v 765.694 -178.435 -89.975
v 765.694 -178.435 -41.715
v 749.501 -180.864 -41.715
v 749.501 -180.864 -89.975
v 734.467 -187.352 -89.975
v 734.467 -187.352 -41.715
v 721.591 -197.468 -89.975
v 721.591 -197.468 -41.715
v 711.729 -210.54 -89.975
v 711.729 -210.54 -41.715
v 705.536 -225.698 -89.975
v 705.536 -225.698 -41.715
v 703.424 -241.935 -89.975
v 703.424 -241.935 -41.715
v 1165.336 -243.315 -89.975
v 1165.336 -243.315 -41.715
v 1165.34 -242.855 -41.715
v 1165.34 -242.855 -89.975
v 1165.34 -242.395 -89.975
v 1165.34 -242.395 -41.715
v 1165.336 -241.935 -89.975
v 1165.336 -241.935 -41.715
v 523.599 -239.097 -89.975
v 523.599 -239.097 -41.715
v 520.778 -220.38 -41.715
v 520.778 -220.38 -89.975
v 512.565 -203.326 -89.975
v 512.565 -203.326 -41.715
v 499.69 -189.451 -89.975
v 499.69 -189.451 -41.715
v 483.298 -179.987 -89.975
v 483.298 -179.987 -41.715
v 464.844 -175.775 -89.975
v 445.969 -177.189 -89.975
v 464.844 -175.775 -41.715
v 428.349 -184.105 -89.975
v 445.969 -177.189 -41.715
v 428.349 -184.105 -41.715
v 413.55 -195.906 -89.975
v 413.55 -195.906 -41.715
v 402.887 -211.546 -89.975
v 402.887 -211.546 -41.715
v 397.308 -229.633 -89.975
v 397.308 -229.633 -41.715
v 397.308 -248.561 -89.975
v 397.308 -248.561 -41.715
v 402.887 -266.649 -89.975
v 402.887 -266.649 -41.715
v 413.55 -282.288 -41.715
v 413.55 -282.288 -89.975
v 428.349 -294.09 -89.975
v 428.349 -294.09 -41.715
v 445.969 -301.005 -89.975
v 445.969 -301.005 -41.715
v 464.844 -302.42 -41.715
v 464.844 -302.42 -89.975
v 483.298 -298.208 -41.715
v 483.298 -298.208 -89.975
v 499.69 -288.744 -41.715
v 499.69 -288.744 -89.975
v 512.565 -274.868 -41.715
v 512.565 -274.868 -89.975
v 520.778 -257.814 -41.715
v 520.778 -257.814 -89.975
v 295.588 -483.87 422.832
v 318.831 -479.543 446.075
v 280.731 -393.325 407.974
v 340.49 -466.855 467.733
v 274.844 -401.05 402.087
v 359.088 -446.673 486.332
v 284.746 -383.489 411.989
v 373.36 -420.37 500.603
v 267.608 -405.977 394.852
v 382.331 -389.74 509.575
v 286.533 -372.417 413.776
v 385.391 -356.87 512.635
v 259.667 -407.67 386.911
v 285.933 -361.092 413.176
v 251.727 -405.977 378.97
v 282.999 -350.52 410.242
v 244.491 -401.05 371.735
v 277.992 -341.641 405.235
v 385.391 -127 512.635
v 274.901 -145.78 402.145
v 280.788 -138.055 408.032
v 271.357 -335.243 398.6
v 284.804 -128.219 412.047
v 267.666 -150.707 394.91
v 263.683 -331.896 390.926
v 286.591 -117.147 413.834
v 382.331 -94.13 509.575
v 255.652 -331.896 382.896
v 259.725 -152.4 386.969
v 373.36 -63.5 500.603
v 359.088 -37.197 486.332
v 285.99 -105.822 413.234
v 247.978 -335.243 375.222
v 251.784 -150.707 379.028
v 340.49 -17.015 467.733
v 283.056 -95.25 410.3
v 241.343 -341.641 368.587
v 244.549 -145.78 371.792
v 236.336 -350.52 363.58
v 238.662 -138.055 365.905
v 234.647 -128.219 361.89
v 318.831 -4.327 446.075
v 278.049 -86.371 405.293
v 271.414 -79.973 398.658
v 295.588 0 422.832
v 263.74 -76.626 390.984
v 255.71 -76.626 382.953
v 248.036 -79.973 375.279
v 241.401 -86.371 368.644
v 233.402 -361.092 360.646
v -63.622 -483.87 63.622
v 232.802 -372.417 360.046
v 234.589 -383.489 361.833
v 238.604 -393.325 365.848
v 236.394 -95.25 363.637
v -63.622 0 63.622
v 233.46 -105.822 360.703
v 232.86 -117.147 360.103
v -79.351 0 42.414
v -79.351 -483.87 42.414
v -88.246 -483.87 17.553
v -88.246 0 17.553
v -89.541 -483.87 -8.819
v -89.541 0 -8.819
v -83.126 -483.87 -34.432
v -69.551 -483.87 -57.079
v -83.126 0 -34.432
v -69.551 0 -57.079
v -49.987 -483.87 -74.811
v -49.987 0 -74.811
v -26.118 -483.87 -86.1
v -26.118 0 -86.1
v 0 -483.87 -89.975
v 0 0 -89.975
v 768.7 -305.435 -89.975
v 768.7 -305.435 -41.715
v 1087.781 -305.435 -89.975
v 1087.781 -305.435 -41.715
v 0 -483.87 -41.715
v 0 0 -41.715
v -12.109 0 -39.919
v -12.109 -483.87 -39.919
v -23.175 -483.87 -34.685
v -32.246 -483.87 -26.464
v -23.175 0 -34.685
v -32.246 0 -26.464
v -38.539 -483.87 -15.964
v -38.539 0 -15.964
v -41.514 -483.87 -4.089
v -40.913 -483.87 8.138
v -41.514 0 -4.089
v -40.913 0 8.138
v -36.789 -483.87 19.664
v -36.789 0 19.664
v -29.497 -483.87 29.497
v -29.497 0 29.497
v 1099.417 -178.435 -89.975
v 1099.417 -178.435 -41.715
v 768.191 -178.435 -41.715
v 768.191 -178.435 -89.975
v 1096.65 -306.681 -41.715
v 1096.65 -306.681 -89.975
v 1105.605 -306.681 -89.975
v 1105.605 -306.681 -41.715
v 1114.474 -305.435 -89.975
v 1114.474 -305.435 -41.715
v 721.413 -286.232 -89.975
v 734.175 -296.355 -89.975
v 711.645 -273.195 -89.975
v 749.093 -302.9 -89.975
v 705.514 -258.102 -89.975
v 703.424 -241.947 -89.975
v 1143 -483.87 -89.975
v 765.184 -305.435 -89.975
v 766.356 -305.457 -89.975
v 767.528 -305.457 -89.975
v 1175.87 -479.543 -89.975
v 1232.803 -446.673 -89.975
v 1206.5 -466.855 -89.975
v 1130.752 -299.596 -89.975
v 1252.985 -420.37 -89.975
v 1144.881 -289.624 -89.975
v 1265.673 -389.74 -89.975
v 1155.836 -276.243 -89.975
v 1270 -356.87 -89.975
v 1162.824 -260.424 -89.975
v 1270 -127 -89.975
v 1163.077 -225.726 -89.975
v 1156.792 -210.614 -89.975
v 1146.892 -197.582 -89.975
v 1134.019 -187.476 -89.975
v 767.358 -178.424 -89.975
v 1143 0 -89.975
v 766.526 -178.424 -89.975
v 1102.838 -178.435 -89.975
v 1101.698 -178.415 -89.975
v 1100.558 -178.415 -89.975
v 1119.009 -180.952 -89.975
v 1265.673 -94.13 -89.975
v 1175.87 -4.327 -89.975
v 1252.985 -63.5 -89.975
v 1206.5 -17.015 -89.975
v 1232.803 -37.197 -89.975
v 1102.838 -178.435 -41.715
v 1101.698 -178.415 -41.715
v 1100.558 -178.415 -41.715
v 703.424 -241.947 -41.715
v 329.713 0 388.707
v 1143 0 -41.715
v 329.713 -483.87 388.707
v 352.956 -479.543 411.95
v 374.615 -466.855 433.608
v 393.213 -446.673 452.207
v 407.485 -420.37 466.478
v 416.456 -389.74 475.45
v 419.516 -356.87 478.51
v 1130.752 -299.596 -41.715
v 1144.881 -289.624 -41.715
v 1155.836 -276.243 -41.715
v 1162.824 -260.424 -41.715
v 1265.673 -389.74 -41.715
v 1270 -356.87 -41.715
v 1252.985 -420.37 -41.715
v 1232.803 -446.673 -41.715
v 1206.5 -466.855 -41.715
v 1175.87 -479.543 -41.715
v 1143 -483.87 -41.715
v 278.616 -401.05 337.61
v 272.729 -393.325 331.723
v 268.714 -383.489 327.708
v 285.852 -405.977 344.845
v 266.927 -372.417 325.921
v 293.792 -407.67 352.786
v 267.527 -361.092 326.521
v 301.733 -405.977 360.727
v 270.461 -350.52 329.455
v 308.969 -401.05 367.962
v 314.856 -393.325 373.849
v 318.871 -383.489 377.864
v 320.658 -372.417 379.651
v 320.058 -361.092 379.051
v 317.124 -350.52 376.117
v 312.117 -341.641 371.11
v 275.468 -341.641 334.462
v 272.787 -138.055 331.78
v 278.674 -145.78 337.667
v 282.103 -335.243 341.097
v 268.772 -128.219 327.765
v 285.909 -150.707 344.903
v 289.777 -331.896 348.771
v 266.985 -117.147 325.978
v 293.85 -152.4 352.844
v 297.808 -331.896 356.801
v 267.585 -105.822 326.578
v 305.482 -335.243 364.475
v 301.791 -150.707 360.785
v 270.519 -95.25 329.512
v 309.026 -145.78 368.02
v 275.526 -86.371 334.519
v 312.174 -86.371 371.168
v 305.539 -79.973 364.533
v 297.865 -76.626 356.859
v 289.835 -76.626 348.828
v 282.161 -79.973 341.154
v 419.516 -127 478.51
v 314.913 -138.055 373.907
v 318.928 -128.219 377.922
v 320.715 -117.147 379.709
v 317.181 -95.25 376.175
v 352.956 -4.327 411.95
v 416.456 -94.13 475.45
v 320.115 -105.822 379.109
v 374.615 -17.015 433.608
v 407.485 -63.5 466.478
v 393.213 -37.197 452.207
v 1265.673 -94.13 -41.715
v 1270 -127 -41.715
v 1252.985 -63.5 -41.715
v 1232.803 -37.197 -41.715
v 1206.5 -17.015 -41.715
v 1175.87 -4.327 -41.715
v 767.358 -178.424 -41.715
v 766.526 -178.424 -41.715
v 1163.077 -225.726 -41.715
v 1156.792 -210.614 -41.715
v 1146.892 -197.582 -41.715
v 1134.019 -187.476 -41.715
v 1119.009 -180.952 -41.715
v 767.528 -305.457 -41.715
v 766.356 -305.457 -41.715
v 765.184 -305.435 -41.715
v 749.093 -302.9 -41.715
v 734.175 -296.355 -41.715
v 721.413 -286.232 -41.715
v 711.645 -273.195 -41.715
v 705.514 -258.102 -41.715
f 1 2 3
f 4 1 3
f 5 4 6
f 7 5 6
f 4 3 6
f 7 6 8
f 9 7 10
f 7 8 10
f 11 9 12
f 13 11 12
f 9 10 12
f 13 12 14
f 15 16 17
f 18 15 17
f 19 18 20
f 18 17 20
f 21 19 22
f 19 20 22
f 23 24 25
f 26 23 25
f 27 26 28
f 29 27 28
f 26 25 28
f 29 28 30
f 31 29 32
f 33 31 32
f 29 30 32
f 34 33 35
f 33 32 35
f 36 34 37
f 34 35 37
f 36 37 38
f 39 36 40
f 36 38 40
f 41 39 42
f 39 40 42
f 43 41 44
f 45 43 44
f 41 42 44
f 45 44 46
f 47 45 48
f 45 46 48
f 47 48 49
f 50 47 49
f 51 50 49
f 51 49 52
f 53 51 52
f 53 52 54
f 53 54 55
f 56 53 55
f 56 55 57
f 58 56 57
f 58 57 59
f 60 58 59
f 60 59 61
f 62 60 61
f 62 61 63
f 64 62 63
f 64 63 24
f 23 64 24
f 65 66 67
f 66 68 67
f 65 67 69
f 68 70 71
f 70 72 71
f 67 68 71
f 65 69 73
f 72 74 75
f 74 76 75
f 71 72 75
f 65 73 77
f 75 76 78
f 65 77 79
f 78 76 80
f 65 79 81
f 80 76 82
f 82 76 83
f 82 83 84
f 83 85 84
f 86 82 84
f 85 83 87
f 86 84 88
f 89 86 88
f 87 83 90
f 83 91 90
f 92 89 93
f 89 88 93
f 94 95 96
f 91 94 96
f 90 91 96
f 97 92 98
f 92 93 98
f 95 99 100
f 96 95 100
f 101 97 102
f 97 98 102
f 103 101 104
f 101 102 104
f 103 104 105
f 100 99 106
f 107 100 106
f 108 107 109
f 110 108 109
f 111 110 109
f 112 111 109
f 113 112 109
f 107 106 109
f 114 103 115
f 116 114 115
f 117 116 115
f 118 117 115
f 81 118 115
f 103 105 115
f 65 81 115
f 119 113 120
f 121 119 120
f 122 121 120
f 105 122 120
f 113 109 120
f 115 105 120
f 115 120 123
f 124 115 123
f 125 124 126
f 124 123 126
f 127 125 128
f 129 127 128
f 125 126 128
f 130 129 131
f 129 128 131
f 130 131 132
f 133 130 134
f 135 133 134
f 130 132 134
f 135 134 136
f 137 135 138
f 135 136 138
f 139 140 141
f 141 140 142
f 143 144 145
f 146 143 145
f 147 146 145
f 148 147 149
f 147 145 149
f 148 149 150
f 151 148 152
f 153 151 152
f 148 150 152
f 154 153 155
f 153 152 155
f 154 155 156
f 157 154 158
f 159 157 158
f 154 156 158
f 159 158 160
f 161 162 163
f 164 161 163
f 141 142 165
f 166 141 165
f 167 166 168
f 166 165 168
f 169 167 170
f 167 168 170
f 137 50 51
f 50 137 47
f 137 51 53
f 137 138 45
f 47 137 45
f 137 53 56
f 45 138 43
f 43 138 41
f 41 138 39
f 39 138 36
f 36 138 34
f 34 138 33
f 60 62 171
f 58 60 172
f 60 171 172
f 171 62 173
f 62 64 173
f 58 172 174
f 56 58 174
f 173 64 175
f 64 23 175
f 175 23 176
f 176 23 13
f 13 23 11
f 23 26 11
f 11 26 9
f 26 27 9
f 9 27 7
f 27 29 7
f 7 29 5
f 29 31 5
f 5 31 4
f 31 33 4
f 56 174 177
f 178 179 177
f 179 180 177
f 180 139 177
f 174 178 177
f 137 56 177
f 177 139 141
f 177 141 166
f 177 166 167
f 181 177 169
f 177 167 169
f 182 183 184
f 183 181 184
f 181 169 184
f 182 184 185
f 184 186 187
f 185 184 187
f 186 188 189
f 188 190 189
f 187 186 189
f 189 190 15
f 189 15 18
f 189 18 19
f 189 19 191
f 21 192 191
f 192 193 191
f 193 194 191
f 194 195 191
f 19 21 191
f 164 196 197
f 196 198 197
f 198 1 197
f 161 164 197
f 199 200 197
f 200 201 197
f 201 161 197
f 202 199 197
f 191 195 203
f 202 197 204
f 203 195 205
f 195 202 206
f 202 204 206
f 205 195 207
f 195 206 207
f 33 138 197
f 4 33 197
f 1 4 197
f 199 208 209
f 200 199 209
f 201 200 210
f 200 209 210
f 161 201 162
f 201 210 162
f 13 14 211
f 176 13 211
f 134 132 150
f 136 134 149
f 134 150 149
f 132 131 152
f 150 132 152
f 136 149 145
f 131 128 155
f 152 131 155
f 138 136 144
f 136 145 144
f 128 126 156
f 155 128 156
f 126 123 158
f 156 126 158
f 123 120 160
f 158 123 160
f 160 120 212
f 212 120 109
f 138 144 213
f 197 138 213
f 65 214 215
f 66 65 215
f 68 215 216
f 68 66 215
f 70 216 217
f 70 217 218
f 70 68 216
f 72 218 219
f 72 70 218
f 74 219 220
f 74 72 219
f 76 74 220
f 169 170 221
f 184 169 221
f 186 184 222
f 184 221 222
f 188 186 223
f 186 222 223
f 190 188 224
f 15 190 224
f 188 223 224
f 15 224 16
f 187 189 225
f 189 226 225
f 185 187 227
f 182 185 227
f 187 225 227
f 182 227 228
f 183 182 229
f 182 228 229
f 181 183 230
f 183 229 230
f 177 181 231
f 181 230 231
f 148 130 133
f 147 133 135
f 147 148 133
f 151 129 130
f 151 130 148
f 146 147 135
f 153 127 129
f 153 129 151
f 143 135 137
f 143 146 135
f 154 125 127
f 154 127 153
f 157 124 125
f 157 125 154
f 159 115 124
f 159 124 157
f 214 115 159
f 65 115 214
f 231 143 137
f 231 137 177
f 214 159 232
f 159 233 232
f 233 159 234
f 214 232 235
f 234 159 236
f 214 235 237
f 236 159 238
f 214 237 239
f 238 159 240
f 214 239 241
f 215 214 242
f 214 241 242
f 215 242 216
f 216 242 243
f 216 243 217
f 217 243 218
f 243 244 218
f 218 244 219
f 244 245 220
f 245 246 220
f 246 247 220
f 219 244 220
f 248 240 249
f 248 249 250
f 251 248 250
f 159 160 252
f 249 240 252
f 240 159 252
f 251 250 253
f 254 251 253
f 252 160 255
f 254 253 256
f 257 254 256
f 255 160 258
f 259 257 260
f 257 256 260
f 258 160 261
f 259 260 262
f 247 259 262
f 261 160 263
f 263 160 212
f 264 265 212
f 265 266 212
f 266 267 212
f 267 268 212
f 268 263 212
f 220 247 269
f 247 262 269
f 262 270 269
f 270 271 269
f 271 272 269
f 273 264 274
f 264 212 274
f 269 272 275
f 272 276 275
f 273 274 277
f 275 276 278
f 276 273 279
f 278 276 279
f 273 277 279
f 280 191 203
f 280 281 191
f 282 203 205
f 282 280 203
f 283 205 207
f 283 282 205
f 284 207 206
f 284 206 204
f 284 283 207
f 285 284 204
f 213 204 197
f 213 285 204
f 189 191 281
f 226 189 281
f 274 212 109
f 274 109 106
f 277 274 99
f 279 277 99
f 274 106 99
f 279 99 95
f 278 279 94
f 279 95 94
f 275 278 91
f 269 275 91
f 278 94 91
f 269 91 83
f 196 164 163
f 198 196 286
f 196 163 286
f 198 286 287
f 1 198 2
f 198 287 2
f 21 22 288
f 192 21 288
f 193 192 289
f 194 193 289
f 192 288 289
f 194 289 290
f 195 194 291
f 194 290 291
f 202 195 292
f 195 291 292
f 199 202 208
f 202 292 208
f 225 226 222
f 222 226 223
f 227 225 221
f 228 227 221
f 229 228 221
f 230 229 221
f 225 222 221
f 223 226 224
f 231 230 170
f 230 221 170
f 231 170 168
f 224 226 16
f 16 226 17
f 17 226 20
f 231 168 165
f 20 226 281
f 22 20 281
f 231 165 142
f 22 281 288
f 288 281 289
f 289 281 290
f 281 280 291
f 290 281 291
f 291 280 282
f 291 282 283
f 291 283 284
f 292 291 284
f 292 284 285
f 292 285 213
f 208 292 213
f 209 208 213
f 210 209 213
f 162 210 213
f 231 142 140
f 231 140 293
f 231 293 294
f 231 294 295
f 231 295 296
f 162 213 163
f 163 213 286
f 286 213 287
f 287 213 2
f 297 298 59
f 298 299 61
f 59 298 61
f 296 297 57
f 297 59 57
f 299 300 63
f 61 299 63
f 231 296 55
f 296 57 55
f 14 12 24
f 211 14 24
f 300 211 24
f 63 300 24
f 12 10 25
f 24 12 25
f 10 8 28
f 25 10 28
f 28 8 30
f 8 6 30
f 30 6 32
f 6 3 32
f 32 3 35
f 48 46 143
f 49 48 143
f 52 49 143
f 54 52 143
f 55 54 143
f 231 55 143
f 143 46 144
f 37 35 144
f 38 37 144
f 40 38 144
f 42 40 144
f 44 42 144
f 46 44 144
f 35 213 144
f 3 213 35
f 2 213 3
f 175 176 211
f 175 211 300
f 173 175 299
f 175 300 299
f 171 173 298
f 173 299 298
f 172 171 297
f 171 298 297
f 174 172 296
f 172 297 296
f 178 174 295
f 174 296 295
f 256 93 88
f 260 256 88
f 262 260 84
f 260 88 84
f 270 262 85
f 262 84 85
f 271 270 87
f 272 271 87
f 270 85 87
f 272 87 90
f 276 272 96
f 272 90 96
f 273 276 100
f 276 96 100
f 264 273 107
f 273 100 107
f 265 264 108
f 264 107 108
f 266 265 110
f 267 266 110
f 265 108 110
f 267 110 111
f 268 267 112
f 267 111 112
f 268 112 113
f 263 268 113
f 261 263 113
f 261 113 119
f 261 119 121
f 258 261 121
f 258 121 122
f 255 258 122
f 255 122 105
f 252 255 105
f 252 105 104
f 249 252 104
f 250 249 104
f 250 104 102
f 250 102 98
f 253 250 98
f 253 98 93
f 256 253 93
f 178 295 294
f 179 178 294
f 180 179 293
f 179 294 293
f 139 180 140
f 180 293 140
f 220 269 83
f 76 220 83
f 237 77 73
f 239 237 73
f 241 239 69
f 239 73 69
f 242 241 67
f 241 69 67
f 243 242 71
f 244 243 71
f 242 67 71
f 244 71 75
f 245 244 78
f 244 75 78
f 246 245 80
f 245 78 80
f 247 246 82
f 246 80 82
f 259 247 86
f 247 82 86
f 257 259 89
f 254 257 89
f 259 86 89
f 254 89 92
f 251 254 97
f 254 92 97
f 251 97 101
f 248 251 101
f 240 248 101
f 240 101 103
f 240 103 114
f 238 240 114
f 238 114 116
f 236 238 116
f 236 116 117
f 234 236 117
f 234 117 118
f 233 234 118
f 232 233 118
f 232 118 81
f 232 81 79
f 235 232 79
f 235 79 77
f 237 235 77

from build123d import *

# Parameters (mm, degrees)
F1_DEPTH = 483.87
F2_R     = 127
F3_R     = 127
F5_DEPTH = 262.8959715366
F6_R     = 38.1
F7_DEPTH = 111.5219220519


with BuildPart() as f1:
    # F0 (on Front) → F1 (new body)
    with BuildSketch(Plane.XZ):
        with BuildLine():
            Line((1270, -41.7147416453), (79.7203516274, -41.7147416453))
            ThreePointArc((79.7203516274, -41.7147416453), (46.5949623447, -76.9698877369), (0, -89.9747416453))
            Line((0, -89.9747416453), (1270, -89.9747416453))
            Line((1270, -89.9747416453), (1270, -41.7147416453))
        make_face()
        with BuildLine():
            ThreePointArc((-63.6217499529, 63.6217499529), (-21.4783157229, 87.373543409), (26.8740245415, 85.8675779271))
            Line((26.8740245415, 85.8675779271), (92.6755573214, 151.669110707))
            Line((92.6755573214, 151.669110707), (419.5160293606, 478.5095827463))
            Line((419.5160293606, 478.5095827463), (385.3910561006, 512.6345560063))
            Line((385.3910561006, 512.6345560063), (-63.6217499529, 63.6217499529))
        make_face()
        with BuildLine():
            ThreePointArc((0, -41.7147416453), (-38.5393960101, -15.963540513), (-29.4967766928, 29.4967766928))
            Line((-29.4967766928, 29.4967766928), (26.8740245415, 85.8675779271))
            ThreePointArc((26.8740245415, 85.8675779271), (-21.4783157229, 87.373543409), (-63.6217499529, 63.6217499529))
            ThreePointArc((-63.6217499529, 63.6217499529), (-83.1258222491, -34.431842959), (0, -89.9747416453))
            ThreePointArc((0, -89.9747416453), (46.5949623447, -76.9698877369), (79.7203516274, -41.7147416453))
            Line((79.7203516274, -41.7147416453), (0, -41.7147416453))
        make_face()
    extrude(amount=F1_DEPTH)

    # F2
    f2_edges = [f1.edges().sort_by_distance(p)[0] for p in [
        (1270, -483.87, -65.844742),
        (1270, 0, -65.844742),
    ]]
    fillet(f2_edges, radius=F2_R)

    # F3
    f3_edges = [f1.edges().sort_by_distance(p)[0] for p in [
        (402.453543, -483.87, 495.572069),
        (402.453543, 0, 495.572069),
    ]]
    fillet(f3_edges, radius=F3_R)

    # F4 (on Top) → F5 (cut)
    with BuildSketch(Plane.XY):
        with BuildLine():
            ThreePointArc((768.1907979278, -178.435), (766.9421834827, -178.4227264611), (765.6935690377, -178.435))
            Line((765.6935690377, -178.435), (768.1907979278, -178.435))
        make_face()
        with BuildLine():
            Line((768.1907979278, -178.435), (765.6935690377, -178.435))
            ThreePointArc((765.6935690377, -178.435), (721.5907686724, -197.4682971963), (703.4238827535, -241.935))
            Line((703.4238827535, -241.935), (703.4238827535, -241.9470549528))
            ThreePointArc((703.4238827535, -241.9470549528), (721.412813036, -286.2315568319), (765.1843390533, -305.435))
            Line((765.1843390533, -305.435), (768.7000279122, -305.435))
            Line((768.7000279122, -305.435), (1087.7811908722, -305.435))
            Line((1087.7811908722, -305.435), (1114.4740463012, -305.435))
            ThreePointArc((1114.4740463012, -305.435), (1150.8110443569, -283.3041158357), (1165.3364646129, -243.3145468461))
            Line((1165.3364646129, -243.3145468461), (1165.3364646129, -241.935))
            ThreePointArc((1165.3364646129, -241.935), (1146.8921429081, -197.581904853), (1102.8377891298, -178.435))
            Line((1102.8377891298, -178.435), (1099.4174480436, -178.435))
            Line((1099.4174480436, -178.435), (768.1907979278, -178.435))
        make_face()
        with BuildLine():
            ThreePointArc((1102.8377891298, -178.435), (1101.1276185867, -178.4122225051), (1099.4174480436, -178.435))
            Line((1099.4174480436, -178.435), (1102.8377891298, -178.435))
        make_face()
        with BuildLine():
            Line((768.7000279122, -305.435), (765.1843390533, -305.435))
            ThreePointArc((765.1843390533, -305.435), (766.9421834827, -305.4593284917), (768.7000279122, -305.435))
        make_face()
        with BuildLine():
            ThreePointArc((1165.3364646129, -243.3145468461), (1165.3401695046, -242.624773423), (1165.3364646129, -241.935))
            Line((1165.3364646129, -241.935), (1165.3364646129, -243.3145468461))
        make_face()
        with BuildLine():
            Line((1114.4740463012, -305.435), (1087.7811908722, -305.435))
            ThreePointArc((1087.7811908722, -305.435), (1101.1276185867, -306.837324341), (1114.4740463012, -305.435))
        make_face()
        with BuildLine():
            ThreePointArc((460.0986740112, -175.5972226858), (415.1973934059, -283.9985032912), (523.5986740112, -239.0972226858))
            ThreePointArc((523.5986740112, -239.0972226858), (504.9999546166, -194.1959420805), (460.0986740112, -175.5972226858))
        make_face()
    extrude(amount=-F5_DEPTH, mode=Mode.SUBTRACT)

    # F6 (on face) → F7 (cut)
    with BuildSketch(Plane(origin=(-63.6217499529, 0, 63.6217499529), x_dir=(0, -1, 0), z_dir=(-0.7071067812, 0, 0.7071067812))):
        with Locations((114.3, 457.2814617571)):
            Circle(F6_R)
        with Locations((369.57, 457.2)):
            Circle(F6_R)
    extrude(amount=-F7_DEPTH, mode=Mode.SUBTRACT)


solid = f1.part
